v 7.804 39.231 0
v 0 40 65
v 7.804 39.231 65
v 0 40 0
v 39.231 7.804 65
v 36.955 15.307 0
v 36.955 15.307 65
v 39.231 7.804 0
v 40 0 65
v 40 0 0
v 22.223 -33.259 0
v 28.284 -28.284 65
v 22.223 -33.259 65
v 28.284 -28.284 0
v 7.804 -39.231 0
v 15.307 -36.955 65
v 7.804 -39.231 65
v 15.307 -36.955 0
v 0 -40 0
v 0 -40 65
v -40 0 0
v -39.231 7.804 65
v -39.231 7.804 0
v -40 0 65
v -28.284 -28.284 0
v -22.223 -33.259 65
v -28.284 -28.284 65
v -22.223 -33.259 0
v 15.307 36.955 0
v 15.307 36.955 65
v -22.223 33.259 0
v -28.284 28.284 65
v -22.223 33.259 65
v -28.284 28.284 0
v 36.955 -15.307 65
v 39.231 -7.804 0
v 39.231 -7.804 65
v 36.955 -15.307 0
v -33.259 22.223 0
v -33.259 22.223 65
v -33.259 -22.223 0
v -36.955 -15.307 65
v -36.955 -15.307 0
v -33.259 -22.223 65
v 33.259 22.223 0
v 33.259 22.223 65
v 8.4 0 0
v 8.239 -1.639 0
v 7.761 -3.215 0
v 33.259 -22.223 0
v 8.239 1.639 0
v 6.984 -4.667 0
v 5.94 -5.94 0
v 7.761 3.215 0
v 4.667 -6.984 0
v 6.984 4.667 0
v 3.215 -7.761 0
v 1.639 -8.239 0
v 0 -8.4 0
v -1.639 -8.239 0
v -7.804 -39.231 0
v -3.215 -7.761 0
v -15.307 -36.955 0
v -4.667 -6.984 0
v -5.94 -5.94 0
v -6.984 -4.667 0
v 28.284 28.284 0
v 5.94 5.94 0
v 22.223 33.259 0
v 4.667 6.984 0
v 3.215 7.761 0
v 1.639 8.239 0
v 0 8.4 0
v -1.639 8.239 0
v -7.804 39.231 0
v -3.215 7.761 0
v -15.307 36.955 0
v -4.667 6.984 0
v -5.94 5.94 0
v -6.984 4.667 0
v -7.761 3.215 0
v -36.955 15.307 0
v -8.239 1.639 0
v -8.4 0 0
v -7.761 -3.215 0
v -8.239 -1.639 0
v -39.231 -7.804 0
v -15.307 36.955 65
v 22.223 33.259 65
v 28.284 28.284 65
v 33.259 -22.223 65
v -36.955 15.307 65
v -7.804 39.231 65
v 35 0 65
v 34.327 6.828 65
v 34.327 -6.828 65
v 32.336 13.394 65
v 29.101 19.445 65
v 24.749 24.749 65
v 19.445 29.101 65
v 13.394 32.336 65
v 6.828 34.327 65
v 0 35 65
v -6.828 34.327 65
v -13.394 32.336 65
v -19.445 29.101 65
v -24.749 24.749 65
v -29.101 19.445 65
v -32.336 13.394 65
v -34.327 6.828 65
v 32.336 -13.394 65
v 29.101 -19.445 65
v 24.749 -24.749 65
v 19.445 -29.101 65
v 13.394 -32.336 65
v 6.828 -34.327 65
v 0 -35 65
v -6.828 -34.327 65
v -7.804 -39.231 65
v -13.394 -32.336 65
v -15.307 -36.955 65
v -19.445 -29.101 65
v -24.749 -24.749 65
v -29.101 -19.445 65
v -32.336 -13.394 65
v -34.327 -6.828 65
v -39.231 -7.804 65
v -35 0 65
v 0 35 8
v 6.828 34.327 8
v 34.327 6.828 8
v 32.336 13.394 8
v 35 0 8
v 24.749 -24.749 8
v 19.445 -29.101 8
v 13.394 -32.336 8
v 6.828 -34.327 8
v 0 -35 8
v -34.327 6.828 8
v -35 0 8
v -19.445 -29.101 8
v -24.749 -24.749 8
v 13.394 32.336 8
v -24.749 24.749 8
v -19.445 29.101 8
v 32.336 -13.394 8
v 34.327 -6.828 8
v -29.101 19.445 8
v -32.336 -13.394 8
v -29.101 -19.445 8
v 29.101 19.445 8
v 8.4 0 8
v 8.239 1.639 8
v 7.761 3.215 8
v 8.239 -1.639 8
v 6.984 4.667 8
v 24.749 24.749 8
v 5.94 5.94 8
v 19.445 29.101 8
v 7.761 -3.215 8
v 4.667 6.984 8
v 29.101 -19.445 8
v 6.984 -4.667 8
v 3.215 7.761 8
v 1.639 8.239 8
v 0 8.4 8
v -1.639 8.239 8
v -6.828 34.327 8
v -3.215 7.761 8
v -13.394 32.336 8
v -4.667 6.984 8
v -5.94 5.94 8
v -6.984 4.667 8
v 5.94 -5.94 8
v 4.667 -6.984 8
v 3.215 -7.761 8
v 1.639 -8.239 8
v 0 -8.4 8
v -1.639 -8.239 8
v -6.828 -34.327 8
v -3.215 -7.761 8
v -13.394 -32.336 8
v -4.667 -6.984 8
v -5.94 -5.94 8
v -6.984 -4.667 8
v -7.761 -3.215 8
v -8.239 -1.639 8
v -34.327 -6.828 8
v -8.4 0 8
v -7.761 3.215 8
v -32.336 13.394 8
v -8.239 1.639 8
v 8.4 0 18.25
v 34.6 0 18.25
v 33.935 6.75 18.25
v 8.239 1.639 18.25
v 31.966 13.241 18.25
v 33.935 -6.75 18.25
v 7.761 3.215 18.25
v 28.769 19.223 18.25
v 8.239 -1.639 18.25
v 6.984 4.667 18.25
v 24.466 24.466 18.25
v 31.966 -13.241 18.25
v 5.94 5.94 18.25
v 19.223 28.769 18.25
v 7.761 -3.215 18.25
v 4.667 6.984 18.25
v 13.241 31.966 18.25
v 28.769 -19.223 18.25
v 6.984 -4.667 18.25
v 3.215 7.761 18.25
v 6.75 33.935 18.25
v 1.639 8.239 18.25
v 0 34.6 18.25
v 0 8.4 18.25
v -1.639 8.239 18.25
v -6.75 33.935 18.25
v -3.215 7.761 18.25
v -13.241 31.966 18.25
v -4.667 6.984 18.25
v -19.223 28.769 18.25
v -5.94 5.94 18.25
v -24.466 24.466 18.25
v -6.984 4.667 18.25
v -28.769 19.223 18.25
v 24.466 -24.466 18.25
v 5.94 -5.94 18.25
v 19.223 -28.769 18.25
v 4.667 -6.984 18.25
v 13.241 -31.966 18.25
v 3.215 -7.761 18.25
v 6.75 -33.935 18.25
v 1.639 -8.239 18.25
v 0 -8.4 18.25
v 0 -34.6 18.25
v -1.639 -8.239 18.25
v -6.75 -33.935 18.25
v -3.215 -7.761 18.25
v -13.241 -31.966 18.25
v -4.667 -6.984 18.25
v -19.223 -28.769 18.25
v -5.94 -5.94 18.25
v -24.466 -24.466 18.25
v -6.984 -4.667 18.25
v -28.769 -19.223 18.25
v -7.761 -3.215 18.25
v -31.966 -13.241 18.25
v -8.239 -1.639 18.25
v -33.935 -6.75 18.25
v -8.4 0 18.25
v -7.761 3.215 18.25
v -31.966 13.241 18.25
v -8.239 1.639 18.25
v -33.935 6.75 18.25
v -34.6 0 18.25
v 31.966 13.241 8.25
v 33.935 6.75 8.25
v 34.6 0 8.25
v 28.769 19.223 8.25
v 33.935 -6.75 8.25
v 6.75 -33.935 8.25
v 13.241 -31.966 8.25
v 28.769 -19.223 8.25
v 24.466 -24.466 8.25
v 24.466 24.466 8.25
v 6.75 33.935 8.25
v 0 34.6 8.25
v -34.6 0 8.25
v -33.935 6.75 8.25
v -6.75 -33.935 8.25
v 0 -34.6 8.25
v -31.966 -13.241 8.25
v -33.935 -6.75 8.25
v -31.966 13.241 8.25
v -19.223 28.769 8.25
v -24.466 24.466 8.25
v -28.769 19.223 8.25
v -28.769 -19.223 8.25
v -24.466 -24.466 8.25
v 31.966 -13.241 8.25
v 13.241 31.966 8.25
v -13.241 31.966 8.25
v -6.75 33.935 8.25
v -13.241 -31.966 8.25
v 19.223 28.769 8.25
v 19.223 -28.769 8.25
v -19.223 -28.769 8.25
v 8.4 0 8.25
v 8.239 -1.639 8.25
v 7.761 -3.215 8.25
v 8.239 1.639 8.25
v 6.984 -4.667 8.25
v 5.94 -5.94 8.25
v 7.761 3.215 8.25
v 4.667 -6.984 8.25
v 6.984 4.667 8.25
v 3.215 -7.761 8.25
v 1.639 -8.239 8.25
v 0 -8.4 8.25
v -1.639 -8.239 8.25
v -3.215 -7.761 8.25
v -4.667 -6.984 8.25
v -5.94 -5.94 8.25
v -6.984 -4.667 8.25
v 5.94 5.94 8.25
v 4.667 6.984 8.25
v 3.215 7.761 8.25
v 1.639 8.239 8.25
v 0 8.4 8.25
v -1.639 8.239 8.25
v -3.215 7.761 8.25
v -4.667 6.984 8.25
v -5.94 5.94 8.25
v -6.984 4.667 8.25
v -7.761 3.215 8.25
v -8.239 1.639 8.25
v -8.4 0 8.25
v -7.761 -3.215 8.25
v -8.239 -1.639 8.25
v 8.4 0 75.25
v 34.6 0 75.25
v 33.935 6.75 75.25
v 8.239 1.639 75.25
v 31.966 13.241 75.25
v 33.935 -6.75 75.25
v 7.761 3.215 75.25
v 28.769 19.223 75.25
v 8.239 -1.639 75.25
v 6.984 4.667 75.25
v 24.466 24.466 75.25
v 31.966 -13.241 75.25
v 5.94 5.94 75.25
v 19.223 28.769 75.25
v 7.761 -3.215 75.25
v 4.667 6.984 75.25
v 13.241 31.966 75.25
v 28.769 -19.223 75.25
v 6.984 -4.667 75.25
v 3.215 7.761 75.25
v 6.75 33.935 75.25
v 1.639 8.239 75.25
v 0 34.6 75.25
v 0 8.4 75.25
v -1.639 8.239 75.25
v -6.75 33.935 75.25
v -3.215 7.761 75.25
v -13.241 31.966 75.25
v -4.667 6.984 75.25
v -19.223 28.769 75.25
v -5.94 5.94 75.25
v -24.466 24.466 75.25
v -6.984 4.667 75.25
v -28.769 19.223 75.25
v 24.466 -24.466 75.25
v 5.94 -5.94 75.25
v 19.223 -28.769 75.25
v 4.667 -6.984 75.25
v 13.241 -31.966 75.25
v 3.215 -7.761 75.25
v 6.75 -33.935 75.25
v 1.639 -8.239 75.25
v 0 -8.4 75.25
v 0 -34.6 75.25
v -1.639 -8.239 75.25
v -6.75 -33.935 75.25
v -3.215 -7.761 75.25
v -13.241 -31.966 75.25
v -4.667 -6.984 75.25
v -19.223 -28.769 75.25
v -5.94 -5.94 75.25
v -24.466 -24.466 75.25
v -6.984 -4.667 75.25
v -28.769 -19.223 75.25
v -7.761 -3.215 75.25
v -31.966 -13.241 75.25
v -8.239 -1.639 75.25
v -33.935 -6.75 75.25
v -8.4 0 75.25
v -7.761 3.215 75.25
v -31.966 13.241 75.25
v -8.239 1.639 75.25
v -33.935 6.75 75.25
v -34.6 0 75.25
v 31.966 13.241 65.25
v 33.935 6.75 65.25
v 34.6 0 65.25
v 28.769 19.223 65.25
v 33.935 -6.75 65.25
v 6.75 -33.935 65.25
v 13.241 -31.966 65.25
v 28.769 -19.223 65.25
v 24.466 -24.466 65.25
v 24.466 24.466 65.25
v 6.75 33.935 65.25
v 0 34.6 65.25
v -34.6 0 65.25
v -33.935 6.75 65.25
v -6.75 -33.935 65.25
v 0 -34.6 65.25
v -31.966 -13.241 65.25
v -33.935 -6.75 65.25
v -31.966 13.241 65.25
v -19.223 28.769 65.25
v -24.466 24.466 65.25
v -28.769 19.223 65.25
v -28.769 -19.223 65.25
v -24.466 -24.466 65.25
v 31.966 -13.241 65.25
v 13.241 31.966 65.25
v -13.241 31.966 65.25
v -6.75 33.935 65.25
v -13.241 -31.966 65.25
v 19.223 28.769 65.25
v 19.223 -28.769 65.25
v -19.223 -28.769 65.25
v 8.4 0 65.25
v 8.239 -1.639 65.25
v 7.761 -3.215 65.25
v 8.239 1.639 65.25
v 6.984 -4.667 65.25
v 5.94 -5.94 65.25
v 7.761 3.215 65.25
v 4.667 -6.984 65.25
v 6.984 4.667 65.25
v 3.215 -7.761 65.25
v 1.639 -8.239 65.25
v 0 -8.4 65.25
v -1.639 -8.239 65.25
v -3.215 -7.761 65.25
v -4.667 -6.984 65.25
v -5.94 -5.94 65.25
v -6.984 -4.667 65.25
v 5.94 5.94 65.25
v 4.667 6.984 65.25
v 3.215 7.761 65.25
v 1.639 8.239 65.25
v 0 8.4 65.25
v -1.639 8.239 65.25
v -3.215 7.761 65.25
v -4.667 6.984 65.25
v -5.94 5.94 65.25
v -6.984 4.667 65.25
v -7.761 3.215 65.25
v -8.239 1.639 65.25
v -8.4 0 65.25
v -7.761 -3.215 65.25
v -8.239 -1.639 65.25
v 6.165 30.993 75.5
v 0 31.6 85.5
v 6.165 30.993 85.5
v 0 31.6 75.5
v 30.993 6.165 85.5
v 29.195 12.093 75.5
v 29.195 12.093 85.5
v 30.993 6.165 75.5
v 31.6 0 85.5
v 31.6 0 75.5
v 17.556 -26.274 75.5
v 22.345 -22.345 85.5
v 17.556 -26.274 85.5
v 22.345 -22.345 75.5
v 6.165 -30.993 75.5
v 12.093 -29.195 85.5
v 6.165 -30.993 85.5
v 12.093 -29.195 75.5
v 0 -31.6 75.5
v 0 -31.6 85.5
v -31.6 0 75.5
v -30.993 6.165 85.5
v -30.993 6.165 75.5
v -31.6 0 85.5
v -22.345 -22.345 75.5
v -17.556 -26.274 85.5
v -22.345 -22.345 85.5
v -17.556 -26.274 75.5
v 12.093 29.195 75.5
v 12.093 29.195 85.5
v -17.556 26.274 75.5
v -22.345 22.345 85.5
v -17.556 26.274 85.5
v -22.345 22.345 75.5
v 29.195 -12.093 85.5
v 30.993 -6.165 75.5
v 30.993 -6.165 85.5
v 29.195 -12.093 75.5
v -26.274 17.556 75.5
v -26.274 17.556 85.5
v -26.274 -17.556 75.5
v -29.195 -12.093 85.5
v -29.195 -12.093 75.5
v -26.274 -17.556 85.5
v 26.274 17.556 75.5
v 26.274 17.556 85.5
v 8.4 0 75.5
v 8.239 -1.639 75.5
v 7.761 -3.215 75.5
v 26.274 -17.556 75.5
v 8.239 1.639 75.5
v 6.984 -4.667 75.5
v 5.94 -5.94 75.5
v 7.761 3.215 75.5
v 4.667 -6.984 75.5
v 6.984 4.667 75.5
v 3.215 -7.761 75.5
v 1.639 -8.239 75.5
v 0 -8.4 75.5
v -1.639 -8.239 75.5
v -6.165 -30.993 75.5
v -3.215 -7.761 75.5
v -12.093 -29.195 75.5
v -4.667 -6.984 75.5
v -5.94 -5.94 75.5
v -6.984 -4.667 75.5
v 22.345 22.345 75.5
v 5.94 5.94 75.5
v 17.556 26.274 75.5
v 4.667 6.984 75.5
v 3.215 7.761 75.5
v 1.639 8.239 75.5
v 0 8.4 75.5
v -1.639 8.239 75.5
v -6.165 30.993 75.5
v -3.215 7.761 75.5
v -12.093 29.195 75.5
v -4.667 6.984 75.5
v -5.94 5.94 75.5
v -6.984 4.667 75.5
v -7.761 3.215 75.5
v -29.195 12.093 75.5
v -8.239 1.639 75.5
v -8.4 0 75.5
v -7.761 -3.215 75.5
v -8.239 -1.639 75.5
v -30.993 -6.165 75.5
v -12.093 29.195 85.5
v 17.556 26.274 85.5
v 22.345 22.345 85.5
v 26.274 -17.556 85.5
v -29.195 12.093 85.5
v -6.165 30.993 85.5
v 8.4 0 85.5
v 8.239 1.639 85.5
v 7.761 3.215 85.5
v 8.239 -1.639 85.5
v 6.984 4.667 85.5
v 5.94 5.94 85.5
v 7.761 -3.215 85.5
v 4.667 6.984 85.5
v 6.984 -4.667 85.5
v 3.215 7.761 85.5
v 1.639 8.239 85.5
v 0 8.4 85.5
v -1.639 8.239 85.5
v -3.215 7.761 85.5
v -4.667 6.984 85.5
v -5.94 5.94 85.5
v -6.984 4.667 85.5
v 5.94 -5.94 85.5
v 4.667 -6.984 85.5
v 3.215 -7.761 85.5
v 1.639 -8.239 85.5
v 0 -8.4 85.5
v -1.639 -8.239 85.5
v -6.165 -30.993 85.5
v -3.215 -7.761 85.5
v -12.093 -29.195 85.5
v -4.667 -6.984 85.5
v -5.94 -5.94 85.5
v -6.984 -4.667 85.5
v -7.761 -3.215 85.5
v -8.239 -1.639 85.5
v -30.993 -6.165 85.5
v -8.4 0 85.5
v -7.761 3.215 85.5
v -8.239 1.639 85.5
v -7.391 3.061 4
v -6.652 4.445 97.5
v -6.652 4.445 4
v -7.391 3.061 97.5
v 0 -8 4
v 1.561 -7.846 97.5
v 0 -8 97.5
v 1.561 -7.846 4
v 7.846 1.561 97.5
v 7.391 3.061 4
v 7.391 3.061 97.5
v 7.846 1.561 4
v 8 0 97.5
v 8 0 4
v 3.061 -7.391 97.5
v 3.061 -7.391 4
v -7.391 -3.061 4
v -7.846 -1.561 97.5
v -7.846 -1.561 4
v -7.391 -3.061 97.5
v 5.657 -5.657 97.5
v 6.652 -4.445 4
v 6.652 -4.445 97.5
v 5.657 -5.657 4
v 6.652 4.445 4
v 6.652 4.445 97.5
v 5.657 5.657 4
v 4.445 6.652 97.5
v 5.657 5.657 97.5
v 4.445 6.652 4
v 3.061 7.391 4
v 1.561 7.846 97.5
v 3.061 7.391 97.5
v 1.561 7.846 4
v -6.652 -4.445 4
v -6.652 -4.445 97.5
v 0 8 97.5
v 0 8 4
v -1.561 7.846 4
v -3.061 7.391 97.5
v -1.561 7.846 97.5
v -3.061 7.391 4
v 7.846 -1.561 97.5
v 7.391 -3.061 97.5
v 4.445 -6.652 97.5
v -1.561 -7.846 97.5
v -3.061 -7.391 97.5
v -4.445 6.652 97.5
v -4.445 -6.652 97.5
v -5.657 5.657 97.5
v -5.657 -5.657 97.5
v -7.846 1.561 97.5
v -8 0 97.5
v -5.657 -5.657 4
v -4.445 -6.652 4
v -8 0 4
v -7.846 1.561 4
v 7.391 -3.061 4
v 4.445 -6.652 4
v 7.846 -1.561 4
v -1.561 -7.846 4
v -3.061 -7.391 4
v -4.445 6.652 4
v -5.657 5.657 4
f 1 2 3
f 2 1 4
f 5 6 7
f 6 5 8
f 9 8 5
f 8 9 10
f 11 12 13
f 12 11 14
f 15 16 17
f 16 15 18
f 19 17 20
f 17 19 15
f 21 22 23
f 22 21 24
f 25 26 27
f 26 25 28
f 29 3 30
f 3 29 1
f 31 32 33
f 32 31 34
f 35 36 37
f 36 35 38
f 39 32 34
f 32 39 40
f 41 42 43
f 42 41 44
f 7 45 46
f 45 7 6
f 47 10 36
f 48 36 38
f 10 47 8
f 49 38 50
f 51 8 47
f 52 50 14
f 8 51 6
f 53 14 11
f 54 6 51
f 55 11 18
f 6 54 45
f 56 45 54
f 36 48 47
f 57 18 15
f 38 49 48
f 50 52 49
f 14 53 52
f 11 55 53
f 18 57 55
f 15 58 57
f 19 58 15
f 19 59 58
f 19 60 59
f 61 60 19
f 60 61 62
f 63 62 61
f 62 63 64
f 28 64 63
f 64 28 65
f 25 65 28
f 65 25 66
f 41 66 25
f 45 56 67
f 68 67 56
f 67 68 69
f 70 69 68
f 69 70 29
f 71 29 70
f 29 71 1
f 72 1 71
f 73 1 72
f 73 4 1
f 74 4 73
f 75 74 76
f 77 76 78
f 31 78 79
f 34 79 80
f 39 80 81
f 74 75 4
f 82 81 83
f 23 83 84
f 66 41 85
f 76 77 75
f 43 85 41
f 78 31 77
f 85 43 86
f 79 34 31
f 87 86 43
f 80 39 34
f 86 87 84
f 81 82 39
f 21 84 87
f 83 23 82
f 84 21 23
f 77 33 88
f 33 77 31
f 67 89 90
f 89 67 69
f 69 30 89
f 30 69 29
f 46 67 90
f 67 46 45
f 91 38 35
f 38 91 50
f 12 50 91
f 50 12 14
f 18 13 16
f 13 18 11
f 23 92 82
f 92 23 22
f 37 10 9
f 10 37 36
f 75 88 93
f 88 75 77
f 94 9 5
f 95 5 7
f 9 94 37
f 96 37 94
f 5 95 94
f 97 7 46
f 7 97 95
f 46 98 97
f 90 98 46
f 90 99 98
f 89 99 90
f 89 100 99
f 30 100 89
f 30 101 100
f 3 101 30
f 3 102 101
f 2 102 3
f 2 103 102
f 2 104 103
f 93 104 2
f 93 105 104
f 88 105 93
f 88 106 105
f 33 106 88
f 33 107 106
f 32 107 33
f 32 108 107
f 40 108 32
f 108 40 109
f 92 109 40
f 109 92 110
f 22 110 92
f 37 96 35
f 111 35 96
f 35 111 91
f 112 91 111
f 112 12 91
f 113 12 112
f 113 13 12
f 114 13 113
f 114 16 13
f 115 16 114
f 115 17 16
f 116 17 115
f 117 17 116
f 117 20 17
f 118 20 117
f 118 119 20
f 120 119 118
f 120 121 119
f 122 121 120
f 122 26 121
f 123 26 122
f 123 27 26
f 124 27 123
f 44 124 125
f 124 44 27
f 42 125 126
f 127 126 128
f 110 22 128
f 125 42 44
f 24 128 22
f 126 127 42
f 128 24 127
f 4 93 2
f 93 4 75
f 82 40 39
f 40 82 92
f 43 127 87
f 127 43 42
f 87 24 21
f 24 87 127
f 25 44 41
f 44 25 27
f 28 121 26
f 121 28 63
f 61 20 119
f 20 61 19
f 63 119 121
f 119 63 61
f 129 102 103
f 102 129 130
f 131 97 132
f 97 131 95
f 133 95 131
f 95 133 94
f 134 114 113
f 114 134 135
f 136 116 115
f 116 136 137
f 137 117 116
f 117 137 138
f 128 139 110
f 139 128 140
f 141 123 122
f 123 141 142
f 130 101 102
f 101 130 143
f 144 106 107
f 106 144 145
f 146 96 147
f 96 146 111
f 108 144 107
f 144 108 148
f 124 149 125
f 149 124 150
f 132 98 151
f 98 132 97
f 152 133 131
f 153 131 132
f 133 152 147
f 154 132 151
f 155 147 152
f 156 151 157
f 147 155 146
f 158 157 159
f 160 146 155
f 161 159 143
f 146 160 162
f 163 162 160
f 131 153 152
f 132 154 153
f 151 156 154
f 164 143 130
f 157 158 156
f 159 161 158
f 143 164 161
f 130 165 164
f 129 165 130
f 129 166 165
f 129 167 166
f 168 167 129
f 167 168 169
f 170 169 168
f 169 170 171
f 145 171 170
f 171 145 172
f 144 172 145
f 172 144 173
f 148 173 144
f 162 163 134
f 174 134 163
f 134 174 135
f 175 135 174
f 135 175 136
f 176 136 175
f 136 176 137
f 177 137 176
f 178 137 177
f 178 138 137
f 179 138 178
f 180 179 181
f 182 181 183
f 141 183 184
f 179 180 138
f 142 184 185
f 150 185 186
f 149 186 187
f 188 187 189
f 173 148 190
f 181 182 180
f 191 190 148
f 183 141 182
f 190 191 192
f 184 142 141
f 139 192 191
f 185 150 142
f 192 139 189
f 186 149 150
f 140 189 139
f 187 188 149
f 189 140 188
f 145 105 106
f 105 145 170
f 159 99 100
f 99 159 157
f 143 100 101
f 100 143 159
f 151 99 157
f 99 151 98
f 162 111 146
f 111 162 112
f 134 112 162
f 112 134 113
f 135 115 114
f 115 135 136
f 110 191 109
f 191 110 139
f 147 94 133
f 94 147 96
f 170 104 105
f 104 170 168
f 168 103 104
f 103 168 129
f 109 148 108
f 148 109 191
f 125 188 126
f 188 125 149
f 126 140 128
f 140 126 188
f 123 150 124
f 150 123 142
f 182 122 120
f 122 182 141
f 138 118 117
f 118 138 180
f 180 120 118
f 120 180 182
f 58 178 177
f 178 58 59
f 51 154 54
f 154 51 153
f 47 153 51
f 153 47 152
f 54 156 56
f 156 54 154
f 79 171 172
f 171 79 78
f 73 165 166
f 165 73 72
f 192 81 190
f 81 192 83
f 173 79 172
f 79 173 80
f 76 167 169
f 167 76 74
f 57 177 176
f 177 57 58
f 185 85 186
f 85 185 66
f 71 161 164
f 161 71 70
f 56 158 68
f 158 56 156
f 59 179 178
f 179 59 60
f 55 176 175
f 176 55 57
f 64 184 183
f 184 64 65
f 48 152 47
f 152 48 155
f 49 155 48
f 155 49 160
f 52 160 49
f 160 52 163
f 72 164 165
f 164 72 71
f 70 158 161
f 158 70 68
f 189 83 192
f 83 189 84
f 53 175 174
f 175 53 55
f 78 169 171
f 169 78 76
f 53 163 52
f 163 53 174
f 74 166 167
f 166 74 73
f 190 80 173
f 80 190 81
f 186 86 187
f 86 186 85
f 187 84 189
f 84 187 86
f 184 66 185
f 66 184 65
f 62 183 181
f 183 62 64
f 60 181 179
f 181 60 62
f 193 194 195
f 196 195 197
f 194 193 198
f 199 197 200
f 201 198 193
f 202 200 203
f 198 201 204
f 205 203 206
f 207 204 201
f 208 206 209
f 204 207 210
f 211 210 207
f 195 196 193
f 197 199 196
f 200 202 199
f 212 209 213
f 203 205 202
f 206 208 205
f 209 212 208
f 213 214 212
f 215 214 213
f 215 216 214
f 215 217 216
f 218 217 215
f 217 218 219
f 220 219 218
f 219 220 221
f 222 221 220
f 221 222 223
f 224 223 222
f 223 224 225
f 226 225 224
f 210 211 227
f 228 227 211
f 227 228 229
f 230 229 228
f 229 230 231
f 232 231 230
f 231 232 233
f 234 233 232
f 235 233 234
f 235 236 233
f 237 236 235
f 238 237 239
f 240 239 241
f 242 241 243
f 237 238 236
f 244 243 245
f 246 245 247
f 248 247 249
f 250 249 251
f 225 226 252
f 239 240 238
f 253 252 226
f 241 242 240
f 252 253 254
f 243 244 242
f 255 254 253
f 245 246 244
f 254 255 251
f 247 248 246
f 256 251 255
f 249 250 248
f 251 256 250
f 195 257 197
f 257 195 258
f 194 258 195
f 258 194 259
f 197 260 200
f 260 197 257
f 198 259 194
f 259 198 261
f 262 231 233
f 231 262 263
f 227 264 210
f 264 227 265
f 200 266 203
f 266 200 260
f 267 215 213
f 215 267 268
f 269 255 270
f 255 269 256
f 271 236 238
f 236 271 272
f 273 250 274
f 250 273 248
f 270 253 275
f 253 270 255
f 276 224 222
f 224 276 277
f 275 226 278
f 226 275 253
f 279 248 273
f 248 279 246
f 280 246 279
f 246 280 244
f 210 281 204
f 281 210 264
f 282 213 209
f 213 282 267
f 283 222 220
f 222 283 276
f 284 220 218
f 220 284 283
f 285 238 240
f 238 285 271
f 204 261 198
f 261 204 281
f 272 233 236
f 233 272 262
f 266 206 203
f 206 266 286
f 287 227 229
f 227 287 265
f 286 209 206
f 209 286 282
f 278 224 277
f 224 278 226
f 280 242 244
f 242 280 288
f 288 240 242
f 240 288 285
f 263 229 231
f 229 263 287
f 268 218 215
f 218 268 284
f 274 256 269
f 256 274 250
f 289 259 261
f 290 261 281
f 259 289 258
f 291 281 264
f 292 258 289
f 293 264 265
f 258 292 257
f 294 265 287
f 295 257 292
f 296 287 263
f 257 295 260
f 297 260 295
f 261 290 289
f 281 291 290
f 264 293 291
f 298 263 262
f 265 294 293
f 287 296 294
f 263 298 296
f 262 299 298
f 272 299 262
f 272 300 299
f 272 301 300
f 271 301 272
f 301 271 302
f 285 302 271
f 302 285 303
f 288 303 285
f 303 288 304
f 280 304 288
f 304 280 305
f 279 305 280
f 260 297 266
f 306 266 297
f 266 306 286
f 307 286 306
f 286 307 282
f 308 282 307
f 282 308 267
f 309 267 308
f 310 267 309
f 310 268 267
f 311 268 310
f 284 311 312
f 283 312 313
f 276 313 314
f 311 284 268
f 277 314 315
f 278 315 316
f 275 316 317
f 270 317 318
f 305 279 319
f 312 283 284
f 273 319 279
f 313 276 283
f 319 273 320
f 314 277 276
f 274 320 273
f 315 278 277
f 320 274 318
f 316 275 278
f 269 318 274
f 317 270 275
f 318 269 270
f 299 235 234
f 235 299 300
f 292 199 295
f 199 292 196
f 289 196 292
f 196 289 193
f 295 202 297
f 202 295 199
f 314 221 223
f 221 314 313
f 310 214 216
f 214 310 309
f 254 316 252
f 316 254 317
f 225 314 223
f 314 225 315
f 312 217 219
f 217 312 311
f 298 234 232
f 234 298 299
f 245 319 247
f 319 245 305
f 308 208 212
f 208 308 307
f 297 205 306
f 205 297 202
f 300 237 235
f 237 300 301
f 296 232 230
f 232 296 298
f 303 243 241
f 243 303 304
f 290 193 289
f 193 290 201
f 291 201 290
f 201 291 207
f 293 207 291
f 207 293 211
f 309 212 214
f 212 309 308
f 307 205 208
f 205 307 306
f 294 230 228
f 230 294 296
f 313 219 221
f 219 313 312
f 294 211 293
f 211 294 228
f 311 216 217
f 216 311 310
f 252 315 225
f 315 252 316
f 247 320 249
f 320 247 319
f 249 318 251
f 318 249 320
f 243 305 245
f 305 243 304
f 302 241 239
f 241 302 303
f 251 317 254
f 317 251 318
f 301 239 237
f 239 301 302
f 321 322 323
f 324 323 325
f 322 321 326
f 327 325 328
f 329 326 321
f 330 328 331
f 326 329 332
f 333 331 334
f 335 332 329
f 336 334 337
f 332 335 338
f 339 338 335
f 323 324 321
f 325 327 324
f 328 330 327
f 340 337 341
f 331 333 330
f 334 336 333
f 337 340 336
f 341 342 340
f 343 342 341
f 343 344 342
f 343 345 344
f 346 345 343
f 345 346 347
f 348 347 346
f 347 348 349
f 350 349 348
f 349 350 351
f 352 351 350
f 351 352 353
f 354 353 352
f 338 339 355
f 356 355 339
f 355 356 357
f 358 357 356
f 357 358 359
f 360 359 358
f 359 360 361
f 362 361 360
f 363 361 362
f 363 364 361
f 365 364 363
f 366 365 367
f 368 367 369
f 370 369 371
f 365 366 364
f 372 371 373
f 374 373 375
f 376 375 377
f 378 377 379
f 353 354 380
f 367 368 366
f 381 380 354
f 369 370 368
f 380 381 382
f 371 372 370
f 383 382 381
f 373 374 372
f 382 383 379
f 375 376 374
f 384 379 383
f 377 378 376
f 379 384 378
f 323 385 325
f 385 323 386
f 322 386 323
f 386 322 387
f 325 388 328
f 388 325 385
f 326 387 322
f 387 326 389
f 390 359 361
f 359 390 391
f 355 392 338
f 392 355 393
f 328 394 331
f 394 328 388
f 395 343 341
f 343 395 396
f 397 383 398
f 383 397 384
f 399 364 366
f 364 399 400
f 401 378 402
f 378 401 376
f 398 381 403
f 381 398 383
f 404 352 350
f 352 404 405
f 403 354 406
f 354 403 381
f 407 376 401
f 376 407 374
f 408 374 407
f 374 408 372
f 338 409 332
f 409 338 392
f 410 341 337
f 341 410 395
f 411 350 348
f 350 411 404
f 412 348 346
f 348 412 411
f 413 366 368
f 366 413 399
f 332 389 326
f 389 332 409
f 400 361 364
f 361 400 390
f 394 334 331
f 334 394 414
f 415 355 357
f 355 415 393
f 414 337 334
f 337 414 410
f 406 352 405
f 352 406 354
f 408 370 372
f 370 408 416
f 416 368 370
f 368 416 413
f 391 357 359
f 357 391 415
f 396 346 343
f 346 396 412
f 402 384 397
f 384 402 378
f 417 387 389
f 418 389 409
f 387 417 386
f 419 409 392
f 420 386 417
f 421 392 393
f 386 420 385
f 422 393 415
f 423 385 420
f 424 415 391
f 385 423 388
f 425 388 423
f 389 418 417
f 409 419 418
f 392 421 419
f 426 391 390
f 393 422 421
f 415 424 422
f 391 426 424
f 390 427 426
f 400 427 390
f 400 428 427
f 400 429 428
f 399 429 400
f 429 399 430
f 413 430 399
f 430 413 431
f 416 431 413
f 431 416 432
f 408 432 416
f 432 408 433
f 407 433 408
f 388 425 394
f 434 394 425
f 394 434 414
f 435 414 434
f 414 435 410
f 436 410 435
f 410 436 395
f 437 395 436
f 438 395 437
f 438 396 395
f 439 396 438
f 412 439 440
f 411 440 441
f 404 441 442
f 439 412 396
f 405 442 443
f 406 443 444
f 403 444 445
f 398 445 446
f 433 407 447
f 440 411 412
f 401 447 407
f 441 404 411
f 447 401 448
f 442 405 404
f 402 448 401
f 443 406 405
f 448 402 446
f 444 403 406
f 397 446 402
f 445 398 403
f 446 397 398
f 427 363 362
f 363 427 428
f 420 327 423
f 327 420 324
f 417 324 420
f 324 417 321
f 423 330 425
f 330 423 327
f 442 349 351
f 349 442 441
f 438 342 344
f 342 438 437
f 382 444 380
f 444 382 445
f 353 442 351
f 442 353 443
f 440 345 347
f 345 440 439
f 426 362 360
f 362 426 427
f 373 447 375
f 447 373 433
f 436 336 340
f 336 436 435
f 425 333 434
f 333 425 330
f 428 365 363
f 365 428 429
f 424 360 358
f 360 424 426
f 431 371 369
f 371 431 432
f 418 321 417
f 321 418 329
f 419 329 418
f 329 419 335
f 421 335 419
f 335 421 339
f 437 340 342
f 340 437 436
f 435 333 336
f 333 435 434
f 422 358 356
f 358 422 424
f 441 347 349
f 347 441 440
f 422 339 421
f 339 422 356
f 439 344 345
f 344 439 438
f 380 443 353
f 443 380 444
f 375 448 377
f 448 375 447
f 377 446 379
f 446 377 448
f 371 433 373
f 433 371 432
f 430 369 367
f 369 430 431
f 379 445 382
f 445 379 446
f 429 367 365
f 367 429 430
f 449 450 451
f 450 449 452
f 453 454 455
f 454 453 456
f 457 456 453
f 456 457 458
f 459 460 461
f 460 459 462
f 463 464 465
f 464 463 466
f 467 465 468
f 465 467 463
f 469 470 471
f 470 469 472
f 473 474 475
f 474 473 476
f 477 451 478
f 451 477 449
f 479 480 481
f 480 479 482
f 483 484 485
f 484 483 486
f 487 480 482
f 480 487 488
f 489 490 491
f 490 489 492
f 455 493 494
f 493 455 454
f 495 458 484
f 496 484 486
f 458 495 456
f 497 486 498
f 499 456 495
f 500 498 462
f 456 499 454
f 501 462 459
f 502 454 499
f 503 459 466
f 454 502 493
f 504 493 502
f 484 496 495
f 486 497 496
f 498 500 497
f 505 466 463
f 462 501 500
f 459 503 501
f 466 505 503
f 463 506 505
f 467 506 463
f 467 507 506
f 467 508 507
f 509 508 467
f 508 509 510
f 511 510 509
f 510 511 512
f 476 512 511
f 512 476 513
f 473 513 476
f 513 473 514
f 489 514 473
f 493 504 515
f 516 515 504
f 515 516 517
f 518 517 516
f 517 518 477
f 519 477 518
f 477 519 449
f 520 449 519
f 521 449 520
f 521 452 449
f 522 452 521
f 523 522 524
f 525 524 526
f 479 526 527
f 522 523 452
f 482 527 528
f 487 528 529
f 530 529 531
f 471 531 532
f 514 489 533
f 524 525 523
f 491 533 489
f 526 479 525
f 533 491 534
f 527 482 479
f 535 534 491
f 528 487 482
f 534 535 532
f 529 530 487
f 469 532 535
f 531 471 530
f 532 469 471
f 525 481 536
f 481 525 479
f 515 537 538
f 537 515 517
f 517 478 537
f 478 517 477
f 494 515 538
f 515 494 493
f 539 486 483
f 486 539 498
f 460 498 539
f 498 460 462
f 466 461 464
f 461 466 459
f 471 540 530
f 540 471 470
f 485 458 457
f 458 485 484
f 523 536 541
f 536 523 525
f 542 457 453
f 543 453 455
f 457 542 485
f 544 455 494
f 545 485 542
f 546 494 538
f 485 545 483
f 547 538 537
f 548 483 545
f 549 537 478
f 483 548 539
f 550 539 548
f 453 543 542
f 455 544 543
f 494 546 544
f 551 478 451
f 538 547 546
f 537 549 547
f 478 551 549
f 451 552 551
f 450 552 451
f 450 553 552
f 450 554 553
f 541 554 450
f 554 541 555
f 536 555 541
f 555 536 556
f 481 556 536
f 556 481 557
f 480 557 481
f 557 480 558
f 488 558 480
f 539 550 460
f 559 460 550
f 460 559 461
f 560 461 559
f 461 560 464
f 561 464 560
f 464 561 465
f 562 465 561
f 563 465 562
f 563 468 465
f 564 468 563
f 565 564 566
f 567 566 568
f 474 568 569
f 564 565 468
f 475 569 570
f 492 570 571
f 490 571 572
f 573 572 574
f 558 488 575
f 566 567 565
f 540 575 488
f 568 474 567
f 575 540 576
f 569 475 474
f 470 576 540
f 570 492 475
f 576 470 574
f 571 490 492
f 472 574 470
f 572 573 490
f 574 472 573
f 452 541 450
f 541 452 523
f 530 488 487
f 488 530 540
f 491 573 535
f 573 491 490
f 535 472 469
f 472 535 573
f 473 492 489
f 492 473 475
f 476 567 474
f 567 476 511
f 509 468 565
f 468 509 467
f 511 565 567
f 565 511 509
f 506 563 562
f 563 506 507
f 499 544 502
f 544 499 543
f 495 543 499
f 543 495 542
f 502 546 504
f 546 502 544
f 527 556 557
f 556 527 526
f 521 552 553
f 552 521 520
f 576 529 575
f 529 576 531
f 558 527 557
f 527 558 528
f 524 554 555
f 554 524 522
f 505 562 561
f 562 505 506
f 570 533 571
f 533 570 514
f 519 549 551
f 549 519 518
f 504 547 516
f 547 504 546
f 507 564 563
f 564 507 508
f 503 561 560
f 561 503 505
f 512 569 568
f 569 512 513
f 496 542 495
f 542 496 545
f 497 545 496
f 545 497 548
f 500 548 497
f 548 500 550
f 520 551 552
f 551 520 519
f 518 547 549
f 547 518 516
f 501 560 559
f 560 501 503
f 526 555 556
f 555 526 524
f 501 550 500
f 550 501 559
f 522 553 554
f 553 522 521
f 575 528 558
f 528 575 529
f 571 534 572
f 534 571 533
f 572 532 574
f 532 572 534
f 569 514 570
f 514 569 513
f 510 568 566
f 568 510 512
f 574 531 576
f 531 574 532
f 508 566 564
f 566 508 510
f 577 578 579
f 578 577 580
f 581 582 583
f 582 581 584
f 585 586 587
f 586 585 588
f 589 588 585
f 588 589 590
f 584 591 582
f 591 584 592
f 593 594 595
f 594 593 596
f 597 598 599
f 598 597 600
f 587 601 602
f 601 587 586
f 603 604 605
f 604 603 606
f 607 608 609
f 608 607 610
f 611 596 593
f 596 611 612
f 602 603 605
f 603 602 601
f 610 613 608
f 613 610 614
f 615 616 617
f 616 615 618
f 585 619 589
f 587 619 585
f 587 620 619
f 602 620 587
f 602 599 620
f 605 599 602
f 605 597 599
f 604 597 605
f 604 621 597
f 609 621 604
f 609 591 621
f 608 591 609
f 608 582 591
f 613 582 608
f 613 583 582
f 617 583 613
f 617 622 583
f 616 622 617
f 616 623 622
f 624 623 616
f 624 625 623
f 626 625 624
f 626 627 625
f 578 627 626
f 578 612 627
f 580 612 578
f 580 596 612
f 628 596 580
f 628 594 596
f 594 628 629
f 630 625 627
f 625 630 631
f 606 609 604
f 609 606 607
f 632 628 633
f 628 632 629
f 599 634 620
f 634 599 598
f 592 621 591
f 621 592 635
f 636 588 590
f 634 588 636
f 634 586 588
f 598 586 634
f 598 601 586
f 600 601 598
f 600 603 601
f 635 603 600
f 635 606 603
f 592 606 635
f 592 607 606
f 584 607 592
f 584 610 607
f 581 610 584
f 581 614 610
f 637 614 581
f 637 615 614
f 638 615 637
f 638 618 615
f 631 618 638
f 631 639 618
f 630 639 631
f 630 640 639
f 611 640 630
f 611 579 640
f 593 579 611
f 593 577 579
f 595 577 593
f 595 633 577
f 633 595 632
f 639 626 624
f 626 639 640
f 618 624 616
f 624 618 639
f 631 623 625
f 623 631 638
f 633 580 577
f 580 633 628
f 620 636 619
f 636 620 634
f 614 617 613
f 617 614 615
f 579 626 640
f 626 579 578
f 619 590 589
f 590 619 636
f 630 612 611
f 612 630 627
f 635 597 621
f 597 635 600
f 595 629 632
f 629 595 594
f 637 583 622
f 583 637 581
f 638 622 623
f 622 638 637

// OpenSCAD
$fn = 32;

// ------------------------------------------------------------------------
// Bearing housing: housing d80, two bearings and a shaft
// Every part is its own module, assembly() places them once.
// ------------------------------------------------------------------------

// --- part 1 ---
module housing() {
  difference() {
    cylinder(h = 65, d = 80);
    translate([0, 0, 8]) cylinder(h = 58, d = 70);
    translate([0, 0, -1]) cylinder(h = 10, d = 16.8);
  }
}

// --- part 2 ---
module bearing_lower() {
  difference() {
      translate([0, 0, 0]) cylinder(h = 10, d = 69.2);
      translate([0, 0, -1]) cylinder(h = 12, d = 16.8);
    }
}

// --- part 3 ---
module bearing_upper() {
  difference() {
      translate([0, 0, 0]) cylinder(h = 10, d = 69.2);
      translate([0, 0, -1]) cylinder(h = 12, d = 16.8);
    }
}

// --- part 4 ---
module spacer() {
  difference() {
      translate([0, 0, 0]) cylinder(h = 10, d = 63.2);
      translate([0, 0, -1]) cylinder(h = 12, d = 16.8);
    }
}

// --- part 5 ---
module shaft() {
  translate([0, 0, -46.75]) cylinder(h = 93.5, d = 16);
}

// --- assembly ---
module assembly() {
  translate([0, 0, 0]) rotate([0, 0, 0]) housing();
  translate([0, 0, 8.25]) rotate([0, 0, 0]) bearing_lower();
  translate([0, 0, 65.25]) rotate([0, 0, 0]) bearing_upper();
  translate([0, 0, 75.5]) rotate([0, 0, 0]) spacer();
  translate([0, 0, 50.75]) rotate([0, 0, 0]) shaft();
}

assembly();
